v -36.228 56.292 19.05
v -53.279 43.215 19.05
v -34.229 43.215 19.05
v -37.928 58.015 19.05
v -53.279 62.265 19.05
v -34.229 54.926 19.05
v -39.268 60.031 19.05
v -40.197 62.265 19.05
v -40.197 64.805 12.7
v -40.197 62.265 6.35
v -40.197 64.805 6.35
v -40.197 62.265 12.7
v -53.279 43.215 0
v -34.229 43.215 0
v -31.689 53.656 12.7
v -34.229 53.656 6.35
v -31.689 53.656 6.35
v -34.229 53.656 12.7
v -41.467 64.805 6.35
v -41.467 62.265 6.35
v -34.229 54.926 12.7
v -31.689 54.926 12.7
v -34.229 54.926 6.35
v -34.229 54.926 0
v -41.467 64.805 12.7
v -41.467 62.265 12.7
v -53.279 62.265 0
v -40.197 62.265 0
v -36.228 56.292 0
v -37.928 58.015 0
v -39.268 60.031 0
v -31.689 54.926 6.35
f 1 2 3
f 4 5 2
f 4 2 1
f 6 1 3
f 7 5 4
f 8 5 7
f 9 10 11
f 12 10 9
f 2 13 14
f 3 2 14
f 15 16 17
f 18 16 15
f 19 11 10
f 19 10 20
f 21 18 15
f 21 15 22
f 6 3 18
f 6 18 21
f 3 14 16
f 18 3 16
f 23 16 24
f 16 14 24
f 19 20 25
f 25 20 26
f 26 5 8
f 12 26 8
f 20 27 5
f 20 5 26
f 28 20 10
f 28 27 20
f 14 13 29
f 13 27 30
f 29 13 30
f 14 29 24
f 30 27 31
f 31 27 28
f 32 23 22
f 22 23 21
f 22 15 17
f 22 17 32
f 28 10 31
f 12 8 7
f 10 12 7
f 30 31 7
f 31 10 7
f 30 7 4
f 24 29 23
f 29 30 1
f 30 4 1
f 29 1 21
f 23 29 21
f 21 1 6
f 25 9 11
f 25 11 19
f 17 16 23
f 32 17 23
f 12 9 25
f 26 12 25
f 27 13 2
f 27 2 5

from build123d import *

# Parameters (mm, degrees)
F0_W     = 19.05
F0_H     = 19.05
F1_DEPTH = 19.05
F3_DEPTH = 25.4
F4_W     = 1.27
F4_H     = 6.35
F5_DEPTH = 2.54
F6_W     = 1.27
F6_H     = 6.35
F7_DEPTH = 2.54


with BuildPart() as f1:
    # F0 (on Top) → F1 (new body)
    with BuildSketch(Plane.XY):
        with Locations((-43.75411, 52.740463)):
            Rectangle(F0_W, F0_H)
    extrude(amount=F1_DEPTH)

    # F2 (on face) → F3 (cut)
    with BuildSketch(Plane.XY.offset(19.05)):
        with BuildLine():
            Line((-34.22911, 62.265463), (-40.196911, 62.265463))
            ThreePointArc((-40.196911, 62.265463), (-37.927985, 58.014519), (-34.22911, 54.926336))
            Line((-34.22911, 54.926336), (-34.22911, 62.265463))
        make_face()
    extrude(amount=-F3_DEPTH, mode=Mode.SUBTRACT)

    # F4 (on face) → F5 (join)
    with BuildSketch(Plane.YZ.offset(-34.22911)):
        with Locations((54.291336, 9.525)):
            Rectangle(F4_W, F4_H)
    extrude(amount=F5_DEPTH)

    # F6 (on face) → F7 (join)
    with BuildSketch(Plane(origin=(0, 62.265463, 0), x_dir=(-1, 0, 0), z_dir=(0, 1, 0))):
        with Locations((40.831911, 9.525)):
            Rectangle(F6_W, F6_H)
    extrude(amount=F7_DEPTH)


solid = f1.part
